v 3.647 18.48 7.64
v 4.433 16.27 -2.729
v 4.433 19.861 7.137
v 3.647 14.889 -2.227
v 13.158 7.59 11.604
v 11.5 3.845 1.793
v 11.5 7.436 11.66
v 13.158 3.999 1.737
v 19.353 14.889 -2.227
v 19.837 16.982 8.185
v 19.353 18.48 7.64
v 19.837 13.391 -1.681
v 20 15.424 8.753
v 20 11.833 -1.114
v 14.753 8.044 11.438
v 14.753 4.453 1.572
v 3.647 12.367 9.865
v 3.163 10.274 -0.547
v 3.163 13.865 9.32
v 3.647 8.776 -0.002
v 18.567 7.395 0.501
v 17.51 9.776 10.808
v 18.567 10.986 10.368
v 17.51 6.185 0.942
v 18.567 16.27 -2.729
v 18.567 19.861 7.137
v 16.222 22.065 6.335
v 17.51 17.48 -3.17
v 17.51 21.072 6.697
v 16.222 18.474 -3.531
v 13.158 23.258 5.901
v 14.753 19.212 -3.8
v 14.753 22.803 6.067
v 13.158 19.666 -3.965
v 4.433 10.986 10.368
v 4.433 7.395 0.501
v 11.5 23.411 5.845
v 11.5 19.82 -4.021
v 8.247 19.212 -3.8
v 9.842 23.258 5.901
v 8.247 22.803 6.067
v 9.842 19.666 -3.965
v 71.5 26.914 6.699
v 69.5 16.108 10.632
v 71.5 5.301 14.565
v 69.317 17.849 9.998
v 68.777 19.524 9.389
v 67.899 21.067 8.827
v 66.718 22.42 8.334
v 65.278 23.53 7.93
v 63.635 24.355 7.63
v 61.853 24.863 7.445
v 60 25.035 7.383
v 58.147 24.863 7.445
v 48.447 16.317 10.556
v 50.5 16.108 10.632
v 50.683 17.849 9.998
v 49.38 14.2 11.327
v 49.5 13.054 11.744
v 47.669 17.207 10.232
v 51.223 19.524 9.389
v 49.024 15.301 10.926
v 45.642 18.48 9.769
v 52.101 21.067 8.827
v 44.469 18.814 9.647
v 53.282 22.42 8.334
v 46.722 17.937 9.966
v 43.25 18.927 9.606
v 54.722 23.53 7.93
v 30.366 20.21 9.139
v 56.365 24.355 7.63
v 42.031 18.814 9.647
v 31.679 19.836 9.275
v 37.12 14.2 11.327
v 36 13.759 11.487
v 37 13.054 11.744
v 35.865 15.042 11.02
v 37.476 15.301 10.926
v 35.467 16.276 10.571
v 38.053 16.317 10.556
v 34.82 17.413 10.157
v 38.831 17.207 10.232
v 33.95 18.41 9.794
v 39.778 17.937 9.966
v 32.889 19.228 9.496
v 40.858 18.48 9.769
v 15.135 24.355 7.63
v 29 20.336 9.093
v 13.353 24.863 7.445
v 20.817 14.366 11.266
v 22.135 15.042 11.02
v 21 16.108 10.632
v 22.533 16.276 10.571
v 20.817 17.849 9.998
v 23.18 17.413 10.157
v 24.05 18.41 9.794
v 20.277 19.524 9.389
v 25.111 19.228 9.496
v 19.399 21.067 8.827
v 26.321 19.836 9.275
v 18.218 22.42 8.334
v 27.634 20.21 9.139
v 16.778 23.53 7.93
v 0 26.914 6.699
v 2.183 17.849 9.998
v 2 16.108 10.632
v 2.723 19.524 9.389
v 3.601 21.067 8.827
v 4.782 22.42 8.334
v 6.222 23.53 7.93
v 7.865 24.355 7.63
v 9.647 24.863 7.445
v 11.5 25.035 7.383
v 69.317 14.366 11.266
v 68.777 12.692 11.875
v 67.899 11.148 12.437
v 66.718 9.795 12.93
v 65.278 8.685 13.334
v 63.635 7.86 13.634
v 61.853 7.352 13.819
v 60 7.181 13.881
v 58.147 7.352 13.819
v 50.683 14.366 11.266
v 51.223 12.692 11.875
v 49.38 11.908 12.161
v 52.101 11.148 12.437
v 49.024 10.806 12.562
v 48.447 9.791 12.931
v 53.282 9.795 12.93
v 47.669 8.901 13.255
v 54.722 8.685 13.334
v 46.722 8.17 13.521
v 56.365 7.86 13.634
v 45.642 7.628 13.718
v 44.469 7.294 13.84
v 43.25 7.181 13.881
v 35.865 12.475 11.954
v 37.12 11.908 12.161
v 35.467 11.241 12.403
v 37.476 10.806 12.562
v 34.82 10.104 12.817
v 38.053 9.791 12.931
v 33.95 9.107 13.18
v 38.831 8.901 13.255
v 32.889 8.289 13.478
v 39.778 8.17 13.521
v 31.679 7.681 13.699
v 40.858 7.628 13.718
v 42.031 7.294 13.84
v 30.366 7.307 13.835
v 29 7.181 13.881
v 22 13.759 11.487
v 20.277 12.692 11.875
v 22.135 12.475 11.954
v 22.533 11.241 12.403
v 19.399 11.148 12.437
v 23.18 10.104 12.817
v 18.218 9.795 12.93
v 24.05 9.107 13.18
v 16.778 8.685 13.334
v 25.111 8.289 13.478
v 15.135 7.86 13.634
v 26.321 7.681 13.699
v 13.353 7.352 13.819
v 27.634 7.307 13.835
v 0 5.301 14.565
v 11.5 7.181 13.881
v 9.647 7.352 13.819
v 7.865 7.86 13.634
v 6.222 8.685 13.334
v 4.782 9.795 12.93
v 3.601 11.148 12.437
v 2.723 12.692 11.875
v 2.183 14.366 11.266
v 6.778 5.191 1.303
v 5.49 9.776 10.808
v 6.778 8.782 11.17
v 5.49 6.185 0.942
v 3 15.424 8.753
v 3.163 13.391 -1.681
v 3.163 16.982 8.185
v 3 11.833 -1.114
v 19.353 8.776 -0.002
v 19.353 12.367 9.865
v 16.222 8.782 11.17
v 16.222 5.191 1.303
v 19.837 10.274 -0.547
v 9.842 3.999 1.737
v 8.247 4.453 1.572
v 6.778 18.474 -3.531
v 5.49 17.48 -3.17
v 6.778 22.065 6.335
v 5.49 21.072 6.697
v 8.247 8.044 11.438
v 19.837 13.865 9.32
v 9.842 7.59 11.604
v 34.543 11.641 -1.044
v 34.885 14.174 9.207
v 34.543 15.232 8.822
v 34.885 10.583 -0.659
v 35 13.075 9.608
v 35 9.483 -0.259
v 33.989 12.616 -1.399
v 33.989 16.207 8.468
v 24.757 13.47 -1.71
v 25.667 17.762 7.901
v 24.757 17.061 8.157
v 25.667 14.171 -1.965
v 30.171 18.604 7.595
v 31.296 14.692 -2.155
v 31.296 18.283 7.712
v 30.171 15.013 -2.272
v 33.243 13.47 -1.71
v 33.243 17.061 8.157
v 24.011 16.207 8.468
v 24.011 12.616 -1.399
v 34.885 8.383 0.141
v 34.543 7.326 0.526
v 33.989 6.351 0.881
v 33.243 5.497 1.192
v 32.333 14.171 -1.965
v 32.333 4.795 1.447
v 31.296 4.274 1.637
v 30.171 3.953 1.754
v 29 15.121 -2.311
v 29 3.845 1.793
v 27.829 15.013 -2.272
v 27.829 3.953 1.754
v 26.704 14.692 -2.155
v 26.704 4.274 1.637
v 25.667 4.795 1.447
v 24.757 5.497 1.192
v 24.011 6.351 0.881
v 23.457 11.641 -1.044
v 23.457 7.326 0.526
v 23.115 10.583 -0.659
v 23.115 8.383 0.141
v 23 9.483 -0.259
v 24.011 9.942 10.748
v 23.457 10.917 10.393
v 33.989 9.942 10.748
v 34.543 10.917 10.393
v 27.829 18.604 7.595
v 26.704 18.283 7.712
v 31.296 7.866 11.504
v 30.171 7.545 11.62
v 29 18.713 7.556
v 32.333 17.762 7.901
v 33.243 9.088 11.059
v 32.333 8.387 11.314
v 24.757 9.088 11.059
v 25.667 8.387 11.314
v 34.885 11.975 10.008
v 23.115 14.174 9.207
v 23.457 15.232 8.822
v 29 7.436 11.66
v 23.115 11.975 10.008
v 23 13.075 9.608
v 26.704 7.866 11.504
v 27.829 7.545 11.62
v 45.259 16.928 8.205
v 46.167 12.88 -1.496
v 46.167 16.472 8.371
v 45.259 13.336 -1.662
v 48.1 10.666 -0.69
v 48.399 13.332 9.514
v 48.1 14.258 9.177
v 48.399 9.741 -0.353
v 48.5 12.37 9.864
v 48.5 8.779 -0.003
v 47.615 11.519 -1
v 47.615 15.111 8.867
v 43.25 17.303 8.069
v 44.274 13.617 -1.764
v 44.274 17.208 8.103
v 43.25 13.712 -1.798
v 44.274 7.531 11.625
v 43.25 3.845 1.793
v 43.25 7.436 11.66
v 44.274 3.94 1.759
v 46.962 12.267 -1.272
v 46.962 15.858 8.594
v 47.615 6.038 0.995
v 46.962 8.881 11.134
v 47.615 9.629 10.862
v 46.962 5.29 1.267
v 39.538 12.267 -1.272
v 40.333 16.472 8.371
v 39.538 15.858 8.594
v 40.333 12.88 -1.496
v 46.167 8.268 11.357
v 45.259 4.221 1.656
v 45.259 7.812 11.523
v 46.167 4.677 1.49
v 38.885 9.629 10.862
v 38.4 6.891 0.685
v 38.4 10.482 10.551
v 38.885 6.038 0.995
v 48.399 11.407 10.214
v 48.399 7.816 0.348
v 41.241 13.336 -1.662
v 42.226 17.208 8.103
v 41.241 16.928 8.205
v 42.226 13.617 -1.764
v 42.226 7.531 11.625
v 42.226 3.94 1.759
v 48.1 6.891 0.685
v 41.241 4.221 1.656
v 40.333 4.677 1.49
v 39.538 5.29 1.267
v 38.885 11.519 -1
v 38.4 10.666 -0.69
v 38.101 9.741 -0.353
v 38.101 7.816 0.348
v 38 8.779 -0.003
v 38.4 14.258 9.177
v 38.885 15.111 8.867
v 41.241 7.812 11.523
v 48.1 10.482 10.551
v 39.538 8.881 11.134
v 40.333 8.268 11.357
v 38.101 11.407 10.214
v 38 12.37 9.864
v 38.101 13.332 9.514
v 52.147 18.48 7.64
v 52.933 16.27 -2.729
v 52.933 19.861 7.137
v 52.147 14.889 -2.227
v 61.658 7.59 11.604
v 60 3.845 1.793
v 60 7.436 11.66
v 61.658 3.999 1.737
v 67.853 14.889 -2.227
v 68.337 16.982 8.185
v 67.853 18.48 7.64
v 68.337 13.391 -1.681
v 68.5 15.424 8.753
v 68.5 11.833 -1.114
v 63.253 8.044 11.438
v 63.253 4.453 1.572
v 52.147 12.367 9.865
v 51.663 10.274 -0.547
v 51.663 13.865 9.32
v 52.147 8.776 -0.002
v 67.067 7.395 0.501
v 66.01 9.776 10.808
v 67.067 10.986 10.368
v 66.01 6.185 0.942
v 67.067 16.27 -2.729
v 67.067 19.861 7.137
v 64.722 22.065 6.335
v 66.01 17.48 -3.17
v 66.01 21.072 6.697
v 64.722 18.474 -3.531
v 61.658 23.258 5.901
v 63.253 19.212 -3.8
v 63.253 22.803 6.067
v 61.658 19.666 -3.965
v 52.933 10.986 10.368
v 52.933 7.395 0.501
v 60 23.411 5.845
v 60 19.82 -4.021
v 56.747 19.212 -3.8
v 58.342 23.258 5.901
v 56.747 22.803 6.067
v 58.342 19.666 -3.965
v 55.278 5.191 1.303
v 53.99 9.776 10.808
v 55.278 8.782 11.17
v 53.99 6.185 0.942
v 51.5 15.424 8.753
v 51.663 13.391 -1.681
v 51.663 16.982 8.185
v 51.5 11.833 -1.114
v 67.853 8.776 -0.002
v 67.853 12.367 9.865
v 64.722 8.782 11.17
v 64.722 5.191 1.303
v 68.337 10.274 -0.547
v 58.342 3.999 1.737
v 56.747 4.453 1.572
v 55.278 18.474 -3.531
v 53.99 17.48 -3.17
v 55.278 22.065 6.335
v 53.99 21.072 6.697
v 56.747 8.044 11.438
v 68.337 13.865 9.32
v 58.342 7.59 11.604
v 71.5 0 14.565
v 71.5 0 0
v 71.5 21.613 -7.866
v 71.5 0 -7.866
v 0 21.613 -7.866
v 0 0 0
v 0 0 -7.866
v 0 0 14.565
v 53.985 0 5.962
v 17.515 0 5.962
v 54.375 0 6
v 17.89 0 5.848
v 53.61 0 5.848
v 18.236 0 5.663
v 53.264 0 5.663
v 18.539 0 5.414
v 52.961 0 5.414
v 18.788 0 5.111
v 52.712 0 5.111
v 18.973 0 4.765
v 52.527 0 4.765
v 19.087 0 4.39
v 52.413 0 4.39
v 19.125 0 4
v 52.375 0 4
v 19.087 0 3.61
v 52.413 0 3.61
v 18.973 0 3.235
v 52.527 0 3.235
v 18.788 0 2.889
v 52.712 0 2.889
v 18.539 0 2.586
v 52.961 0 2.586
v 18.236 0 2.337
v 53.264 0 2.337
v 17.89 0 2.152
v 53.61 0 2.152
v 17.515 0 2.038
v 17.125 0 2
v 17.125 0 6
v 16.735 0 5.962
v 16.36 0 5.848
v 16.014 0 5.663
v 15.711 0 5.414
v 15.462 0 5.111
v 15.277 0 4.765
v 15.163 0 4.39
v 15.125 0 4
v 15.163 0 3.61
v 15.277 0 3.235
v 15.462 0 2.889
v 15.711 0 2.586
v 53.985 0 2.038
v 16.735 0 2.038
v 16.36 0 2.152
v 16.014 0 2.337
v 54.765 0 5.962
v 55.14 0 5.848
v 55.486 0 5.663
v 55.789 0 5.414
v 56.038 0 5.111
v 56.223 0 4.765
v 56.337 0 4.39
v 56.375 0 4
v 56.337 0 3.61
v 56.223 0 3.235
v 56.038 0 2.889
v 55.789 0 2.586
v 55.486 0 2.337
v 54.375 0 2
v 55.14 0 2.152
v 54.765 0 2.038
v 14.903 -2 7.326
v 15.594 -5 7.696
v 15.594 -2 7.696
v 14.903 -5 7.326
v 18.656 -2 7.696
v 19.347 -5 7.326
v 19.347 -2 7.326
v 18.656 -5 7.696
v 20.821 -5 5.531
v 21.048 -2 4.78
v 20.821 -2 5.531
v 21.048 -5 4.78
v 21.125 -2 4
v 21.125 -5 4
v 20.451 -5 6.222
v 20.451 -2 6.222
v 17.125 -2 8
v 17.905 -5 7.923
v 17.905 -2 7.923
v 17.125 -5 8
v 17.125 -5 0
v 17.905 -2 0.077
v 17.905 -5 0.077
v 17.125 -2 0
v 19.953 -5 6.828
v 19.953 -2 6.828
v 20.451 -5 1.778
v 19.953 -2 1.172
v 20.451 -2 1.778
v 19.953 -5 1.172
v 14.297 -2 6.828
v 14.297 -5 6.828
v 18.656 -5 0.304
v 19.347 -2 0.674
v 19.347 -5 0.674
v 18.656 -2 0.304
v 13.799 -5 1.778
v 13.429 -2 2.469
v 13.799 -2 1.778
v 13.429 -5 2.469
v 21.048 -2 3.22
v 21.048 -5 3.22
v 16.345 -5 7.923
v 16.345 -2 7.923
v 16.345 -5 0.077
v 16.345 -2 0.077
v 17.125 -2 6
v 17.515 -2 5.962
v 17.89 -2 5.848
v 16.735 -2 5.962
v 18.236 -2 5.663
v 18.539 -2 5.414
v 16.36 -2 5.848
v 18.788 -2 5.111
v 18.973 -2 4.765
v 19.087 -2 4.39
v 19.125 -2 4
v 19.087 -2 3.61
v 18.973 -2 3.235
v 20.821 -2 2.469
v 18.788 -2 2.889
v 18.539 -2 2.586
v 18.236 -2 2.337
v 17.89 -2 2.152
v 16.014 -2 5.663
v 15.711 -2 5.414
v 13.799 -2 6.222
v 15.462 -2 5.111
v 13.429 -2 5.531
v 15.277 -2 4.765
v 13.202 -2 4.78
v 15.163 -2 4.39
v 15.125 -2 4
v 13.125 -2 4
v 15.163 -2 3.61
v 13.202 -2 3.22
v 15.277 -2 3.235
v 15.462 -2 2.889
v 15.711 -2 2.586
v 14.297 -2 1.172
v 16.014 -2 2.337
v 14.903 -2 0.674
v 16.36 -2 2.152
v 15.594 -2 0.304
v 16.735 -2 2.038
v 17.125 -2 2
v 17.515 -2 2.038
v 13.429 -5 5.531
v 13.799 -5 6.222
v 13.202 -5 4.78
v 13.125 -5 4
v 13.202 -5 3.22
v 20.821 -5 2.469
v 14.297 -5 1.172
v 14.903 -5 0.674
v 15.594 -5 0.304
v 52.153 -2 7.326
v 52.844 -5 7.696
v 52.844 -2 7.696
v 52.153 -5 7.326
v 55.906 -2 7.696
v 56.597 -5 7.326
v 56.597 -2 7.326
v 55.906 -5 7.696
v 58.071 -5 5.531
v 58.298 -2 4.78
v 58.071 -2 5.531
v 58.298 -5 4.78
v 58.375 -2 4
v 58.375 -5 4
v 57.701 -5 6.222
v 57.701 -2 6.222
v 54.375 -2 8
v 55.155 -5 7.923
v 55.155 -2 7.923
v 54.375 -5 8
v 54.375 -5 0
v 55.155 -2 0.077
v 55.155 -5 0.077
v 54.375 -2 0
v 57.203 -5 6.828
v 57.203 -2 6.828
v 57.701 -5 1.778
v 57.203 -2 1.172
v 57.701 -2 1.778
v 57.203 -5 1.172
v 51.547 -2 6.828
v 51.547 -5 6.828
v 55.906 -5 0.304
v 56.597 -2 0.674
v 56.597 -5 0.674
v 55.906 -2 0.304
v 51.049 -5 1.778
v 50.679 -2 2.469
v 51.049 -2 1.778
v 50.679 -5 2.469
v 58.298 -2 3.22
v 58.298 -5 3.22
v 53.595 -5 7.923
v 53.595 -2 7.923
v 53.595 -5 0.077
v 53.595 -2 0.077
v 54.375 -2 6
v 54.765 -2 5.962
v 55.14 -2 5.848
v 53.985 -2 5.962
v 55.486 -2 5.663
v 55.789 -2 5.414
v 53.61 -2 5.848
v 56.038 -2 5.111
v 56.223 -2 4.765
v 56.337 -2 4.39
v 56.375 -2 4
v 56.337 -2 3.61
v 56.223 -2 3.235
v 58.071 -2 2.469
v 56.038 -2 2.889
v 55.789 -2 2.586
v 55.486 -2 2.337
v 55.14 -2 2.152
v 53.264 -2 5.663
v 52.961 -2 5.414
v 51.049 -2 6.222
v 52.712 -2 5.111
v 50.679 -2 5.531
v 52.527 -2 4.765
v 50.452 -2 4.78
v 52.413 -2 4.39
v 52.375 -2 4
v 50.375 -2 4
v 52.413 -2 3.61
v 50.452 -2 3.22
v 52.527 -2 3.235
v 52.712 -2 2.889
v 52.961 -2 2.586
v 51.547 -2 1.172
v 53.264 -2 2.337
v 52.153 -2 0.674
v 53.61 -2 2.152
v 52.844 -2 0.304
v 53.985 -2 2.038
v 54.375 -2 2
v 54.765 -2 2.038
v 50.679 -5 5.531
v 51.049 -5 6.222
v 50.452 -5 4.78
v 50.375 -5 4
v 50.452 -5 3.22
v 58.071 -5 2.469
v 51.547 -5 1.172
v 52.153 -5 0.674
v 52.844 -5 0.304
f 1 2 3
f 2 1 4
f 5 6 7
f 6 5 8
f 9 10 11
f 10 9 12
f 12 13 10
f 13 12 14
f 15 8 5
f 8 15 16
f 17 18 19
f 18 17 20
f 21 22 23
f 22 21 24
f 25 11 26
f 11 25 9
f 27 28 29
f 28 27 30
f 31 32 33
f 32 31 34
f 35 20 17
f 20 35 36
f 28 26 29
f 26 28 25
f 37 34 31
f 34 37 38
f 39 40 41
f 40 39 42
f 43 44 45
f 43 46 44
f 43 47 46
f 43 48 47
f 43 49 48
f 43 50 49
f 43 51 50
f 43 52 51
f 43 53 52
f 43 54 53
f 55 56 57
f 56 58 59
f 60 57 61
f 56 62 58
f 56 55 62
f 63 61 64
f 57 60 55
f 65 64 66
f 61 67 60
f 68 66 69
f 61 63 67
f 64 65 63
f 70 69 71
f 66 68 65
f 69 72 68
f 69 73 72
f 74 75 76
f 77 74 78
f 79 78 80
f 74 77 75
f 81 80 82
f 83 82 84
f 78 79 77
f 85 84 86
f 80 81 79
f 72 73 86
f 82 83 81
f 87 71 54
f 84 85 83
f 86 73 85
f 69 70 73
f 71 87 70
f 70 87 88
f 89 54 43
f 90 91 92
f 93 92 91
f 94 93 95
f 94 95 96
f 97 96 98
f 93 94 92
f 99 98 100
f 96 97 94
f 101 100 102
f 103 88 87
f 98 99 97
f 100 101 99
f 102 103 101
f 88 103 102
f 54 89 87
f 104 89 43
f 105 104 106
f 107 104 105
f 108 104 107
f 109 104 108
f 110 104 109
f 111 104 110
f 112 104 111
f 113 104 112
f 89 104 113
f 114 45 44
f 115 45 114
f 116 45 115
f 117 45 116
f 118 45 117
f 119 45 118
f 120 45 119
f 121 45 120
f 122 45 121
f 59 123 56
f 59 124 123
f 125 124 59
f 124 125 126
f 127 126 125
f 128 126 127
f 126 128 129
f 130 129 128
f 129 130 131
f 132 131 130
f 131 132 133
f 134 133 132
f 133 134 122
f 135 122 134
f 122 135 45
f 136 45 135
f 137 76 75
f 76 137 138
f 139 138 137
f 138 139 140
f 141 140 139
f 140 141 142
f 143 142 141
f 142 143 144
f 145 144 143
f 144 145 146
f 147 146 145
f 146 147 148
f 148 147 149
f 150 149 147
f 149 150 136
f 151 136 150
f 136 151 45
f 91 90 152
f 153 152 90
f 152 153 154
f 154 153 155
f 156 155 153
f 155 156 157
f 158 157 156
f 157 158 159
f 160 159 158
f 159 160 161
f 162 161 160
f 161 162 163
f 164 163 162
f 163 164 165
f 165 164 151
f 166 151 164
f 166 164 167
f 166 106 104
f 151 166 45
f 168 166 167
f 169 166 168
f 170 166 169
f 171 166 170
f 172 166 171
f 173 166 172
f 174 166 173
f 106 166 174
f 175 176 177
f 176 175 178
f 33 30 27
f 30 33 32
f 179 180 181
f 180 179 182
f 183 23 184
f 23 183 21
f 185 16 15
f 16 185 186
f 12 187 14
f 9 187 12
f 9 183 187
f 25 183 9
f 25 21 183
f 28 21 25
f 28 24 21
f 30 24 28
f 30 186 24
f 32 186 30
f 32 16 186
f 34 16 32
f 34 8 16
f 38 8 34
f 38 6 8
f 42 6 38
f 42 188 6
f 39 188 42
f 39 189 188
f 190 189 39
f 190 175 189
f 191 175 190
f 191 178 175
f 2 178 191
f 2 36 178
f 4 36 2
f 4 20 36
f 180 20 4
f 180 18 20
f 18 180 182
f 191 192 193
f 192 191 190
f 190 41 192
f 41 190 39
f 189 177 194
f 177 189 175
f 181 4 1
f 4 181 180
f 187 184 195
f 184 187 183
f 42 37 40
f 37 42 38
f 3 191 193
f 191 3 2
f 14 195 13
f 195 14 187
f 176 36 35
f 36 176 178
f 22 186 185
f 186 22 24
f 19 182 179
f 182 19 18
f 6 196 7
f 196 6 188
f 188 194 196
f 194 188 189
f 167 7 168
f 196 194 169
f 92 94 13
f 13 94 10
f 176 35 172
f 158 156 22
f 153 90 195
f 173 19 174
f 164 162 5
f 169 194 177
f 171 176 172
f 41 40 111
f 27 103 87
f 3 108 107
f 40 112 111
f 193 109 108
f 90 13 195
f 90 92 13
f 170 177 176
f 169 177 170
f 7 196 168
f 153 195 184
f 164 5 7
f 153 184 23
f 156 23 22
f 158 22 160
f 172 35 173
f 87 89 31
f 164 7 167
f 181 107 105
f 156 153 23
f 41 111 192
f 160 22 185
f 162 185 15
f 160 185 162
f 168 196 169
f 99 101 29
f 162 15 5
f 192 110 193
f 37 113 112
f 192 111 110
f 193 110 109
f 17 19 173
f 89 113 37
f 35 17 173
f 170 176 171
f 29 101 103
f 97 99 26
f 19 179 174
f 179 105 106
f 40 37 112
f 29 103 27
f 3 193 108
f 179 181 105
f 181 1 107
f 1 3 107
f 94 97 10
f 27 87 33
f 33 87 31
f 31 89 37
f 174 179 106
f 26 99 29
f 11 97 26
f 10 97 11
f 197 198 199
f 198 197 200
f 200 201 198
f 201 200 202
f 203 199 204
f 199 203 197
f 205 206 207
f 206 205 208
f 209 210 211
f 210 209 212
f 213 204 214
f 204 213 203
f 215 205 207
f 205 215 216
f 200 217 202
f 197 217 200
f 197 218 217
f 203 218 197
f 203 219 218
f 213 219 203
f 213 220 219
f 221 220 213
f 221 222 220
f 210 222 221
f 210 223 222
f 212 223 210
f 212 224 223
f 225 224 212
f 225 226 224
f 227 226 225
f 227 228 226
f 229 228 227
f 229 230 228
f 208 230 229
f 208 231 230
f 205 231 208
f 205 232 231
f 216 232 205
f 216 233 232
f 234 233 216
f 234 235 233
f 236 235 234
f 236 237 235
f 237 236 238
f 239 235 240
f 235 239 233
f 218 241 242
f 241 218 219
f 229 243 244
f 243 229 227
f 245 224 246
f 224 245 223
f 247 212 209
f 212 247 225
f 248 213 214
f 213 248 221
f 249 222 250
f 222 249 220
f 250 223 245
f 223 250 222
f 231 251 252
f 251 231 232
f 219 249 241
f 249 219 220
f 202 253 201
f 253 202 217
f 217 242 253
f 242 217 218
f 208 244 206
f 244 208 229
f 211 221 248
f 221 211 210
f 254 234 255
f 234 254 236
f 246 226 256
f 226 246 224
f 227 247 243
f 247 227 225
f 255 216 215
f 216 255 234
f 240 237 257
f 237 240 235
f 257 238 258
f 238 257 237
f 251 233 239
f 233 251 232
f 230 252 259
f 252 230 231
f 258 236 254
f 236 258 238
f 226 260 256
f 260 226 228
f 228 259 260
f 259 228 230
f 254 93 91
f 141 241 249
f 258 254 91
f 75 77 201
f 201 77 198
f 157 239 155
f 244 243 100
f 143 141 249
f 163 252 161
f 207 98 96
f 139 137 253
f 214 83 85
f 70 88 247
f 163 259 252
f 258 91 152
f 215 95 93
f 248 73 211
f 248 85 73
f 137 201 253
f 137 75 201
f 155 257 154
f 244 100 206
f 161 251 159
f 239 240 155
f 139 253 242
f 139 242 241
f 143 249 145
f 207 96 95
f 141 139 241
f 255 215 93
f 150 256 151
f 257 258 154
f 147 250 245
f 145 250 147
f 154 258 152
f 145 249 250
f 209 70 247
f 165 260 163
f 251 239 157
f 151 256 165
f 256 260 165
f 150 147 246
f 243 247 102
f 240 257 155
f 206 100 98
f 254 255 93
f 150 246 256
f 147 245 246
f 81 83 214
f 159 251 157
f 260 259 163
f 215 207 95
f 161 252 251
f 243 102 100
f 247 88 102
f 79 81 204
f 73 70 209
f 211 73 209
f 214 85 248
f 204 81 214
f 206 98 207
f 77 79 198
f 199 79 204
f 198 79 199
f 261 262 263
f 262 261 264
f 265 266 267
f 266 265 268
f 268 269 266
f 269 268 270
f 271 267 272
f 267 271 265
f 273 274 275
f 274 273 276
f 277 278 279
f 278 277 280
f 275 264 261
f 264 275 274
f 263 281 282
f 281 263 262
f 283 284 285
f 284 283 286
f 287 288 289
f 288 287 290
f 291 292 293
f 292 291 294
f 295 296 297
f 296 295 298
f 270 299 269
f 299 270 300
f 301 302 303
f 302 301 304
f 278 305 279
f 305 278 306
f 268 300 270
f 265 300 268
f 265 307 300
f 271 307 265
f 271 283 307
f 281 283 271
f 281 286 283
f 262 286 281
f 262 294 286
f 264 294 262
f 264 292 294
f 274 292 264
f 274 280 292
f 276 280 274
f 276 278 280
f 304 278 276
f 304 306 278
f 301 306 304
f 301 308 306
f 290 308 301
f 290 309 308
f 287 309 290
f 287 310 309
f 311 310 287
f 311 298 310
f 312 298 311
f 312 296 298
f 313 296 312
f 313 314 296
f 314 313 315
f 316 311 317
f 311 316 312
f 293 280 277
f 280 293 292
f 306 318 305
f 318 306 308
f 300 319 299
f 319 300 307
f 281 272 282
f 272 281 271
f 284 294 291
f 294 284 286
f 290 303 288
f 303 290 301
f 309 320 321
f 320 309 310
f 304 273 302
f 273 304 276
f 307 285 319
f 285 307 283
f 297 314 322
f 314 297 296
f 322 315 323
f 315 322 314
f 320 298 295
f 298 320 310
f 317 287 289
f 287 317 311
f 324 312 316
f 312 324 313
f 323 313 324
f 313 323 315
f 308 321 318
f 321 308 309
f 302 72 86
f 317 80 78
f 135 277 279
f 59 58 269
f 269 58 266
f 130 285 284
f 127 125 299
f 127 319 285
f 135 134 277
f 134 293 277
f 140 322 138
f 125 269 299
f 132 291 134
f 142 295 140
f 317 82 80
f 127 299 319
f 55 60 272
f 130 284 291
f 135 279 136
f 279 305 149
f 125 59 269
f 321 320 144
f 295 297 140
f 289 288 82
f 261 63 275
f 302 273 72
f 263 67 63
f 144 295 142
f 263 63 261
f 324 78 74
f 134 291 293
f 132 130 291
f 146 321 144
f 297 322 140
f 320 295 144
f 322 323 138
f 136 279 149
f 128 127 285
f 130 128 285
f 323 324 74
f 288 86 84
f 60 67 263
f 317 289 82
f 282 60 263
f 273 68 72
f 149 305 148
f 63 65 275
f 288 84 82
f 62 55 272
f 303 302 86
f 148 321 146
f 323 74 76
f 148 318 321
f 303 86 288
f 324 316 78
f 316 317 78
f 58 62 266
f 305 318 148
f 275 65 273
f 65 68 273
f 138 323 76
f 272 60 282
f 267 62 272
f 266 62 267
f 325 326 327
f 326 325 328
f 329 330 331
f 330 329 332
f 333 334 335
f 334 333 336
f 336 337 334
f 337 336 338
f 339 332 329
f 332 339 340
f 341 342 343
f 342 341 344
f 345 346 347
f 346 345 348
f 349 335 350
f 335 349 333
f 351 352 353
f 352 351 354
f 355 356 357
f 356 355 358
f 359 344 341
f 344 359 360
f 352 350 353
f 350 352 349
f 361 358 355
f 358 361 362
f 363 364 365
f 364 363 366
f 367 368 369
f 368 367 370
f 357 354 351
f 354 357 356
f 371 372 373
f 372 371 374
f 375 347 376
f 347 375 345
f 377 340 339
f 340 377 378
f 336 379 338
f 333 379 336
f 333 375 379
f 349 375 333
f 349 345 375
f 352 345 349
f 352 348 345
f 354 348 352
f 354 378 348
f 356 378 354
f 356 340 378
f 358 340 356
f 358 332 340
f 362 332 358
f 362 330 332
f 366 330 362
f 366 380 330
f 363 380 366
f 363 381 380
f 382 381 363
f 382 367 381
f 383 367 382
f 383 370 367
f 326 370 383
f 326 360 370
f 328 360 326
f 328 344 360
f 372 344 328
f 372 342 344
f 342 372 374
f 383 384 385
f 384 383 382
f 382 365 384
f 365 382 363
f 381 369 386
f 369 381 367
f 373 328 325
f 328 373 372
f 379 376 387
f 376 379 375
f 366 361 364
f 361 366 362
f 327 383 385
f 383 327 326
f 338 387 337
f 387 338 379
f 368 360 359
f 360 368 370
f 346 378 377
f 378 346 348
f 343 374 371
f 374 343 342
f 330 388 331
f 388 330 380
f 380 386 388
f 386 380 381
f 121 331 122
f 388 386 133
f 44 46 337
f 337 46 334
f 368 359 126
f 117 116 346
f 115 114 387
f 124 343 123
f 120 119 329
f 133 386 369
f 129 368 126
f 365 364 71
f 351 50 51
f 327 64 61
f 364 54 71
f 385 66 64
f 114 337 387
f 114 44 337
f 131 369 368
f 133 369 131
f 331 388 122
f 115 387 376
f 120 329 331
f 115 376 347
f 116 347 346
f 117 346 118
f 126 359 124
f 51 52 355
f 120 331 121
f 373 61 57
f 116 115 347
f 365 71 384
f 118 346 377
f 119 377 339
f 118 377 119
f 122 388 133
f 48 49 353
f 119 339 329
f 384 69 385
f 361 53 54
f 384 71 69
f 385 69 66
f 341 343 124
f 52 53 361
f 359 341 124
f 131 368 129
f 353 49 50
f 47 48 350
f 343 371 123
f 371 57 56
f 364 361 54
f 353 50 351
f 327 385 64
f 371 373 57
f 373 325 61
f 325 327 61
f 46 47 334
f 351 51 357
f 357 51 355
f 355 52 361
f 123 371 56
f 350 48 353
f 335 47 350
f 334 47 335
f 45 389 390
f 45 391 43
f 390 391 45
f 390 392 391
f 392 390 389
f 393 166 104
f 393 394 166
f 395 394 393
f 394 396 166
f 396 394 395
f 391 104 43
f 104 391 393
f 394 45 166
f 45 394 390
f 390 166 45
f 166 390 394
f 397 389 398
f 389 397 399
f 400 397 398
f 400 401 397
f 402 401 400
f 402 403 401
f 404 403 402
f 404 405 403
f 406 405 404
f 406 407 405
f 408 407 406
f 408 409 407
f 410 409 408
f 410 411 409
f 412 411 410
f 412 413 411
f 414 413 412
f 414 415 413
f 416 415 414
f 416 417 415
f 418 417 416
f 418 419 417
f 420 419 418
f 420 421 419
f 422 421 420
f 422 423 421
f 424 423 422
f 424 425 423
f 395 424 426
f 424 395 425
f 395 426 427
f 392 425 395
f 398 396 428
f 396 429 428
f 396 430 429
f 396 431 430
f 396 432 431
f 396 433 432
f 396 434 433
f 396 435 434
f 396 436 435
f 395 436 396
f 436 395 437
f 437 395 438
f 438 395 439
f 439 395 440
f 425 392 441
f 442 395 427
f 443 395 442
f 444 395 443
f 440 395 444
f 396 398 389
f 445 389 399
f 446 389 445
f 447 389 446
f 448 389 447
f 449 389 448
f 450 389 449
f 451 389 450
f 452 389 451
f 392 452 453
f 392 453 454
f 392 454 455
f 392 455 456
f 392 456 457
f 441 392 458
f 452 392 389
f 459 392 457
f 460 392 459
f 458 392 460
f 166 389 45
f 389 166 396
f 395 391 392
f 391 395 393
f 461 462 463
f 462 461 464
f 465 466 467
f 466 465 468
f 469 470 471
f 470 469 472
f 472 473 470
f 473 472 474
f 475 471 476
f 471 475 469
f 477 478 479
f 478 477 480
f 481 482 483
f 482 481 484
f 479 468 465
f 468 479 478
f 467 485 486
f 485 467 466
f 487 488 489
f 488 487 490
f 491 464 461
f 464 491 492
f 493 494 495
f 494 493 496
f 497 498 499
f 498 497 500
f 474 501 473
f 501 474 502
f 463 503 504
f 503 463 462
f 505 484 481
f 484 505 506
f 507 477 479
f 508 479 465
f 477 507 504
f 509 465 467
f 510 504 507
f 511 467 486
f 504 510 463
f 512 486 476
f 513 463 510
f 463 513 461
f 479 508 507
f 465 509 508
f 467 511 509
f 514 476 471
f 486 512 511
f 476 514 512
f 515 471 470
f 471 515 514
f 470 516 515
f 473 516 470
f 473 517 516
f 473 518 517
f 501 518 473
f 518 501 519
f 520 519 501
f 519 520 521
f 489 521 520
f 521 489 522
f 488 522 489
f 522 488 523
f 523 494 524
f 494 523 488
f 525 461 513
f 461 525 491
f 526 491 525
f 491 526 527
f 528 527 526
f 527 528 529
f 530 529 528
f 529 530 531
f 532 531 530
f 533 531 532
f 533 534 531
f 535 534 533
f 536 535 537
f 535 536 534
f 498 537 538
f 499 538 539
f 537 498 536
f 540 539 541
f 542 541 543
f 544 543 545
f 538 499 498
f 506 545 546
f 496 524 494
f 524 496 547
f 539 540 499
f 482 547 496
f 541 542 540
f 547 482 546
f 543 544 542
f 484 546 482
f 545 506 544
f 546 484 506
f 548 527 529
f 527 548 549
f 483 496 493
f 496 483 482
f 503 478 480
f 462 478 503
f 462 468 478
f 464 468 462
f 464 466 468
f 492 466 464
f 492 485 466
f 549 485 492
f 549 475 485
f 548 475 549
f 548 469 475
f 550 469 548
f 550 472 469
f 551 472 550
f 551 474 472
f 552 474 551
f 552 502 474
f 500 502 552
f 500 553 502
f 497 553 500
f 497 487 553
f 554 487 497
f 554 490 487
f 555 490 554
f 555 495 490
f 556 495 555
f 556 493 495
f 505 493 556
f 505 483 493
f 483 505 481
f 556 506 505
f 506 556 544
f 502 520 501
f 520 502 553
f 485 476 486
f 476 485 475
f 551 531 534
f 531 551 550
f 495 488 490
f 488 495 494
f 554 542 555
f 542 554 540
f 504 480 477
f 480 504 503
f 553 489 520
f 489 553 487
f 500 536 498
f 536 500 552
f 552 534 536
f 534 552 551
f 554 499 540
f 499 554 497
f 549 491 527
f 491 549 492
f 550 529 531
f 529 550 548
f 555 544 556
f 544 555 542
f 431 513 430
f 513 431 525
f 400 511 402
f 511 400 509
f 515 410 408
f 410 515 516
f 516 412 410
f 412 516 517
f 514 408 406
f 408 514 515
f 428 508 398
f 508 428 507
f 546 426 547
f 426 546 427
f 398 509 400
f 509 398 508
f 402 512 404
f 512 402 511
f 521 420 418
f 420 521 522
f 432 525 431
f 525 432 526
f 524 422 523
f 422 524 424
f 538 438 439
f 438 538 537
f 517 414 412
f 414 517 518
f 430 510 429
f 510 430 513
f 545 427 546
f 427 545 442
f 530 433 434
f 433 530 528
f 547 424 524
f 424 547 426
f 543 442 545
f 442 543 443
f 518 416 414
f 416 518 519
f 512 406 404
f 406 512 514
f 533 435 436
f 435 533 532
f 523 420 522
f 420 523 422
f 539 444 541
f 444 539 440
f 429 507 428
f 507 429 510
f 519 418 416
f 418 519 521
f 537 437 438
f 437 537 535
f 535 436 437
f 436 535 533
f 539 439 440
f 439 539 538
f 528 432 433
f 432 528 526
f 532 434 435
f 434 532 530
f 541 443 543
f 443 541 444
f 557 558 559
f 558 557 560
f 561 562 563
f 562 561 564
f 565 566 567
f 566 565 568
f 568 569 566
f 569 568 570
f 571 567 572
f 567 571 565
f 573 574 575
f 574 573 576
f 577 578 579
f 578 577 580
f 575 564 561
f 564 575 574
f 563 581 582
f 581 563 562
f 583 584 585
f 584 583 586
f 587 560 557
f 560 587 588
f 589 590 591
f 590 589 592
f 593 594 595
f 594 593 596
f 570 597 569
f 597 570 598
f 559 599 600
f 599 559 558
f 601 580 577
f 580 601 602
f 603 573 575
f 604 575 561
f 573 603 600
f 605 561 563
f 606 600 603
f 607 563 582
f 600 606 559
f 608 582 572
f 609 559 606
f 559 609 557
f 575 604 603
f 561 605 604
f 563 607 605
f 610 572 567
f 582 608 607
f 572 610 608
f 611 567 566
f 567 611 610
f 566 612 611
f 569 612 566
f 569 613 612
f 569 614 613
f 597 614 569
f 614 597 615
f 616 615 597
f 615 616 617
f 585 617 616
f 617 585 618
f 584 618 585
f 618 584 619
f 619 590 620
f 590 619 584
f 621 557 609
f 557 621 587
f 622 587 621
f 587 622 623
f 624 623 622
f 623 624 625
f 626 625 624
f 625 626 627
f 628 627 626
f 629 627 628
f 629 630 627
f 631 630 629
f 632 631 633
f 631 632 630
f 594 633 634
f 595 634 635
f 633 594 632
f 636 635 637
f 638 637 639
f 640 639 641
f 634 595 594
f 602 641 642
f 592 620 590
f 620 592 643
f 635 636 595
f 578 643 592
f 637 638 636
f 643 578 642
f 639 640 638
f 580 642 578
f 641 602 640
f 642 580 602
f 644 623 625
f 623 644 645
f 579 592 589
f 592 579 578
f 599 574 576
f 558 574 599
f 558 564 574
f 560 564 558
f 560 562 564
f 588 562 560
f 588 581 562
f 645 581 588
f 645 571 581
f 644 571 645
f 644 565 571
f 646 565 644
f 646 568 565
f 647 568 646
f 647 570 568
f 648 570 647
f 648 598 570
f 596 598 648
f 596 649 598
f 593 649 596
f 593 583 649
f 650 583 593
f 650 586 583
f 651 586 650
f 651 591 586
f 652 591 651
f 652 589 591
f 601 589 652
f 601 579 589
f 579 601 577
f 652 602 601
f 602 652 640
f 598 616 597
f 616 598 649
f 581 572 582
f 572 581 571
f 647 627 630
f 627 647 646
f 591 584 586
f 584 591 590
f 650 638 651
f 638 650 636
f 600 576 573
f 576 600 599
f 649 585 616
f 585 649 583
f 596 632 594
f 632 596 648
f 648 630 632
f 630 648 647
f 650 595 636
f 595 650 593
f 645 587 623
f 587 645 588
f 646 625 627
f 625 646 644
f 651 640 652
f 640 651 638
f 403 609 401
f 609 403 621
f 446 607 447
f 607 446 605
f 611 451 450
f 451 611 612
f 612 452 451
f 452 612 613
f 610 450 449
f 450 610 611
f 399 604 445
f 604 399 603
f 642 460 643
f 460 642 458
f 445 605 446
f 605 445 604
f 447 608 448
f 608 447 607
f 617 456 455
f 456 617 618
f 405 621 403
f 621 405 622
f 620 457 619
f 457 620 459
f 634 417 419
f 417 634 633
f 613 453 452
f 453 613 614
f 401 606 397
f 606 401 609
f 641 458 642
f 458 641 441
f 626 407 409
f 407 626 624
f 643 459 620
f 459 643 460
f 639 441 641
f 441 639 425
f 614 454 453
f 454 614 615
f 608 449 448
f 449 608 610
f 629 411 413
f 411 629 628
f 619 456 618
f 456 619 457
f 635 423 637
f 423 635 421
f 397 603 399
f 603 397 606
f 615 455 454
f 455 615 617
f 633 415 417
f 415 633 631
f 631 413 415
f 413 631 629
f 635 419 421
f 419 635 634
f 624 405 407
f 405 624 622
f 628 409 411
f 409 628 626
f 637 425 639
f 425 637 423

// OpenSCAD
// file: modules/module_pegs.scad
module pegs_lux(width,rows)
{
    dia_knob    = 8;
    len_knob    = 3;
    dia_pin     = 4;
    wall        = 2;
    dist        = 37.25;
    height      = 25;
    
    pegs(dist,height,wall,dia_knob,len_knob,dia_pin,rows);
}

module pegs_hornbach(width,rows)
{
    dia_knob    = 8;
    len_knob    = 3;
    dia_pin     = 4;
    wall        = 2;
    dist        = 45;
    height      = 45;
    
    pegs(dist,height,wall,dia_knob,len_knob,dia_pin);
}

module pegs(dist,height,wall,dia_knob,len_knob,dia_pin,rows)
{
    for(off_y=[0:height:(rows-1)*height])
    {
        translate([dia_knob/2,0,off_y+dia_knob/2])
        {
            for(i=[0:dist:width-dia_knob])
            {
                translate([i+((width-dia_knob)%dist)/2,0,0])
                {
                    peg(wall,dia_knob,len_knob,dia_pin);
                }
            }
        }
    }
}

module peg(wall,dia_knob,len_knob,dia_pin)
{
    rotate([90,0,0])
    {
        translate([0,0,wall])
        {
            cylinder(h=len_knob,d=dia_knob);
        }
        translate([0,0,0])
        {
            cylinder(h=wall,d=dia_pin);
        }
    }
}
// file: modules/module_sockets.scad
function partialsum(list,start,end) = [for (sum=0, i=start; i<=end; nsum=sum+list[i], i=i+1, sum=nsum) sum];

module wrench_sockets(size_array,space,depth,angle)
{
    width = max(size_array)+2*space;
    height = depth+space;
    length_vec      = partialsum(size_array,0,len(size_array)-1);
    total_length    = length_vec[len(length_vec)-1]
                    + size_array[len(size_array)-1]
                    + space*(len(size_array)-1)
                    + 2*space;
    
    // upper wedge
    rotate([90,0,90])
    {
        linear_extrude(height = total_length)
        {
            polygon([[0,0],[0,height*cos(angle)],[height*sin(angle),height*cos(angle)]]);
        }
    }

    // lower wedge
    translate([0,0,0.000001]) // fix for non manifold
    {
        rotate([0,90,0])
        {
            linear_extrude(height = total_length)
            {
                polygon([[0,0],[width*sin(angle),0],[width*sin(angle),width*cos(angle)]]);
            }
        }
    }

    // main body
    rotate([-angle,0,0])
    {
        difference()
        {
            cube([total_length,width,depth+space]);
            
            for(num=[0:1:len(size_array)-1])
            {
                off=partialsum(size_array,0,num);
                translate([off[num]+size_array[num]/2+num*space+space,
                           size_array[num]/2+space,
                           space])
                {
                    cylinder(h=depth,d=size_array[num]);
                    translate([0,0,depth-2])
                    {
                        cylinder(h=2,d1=size_array[num],d2=size_array[num]+2);
                    }
                }
            }
        }
    }
}
// main file
$fn=32;

include <modules/module_sockets.scad>
include <modules/module_pegs.scad>

sockets         = [17,12,10.5,17];
space           = 3;
depth           = 12.5;
angle           = 20;
rows            = 1;

// calculate total length for connectors
length_vec      = partialsum(sockets,0,len(sockets)-1);
width           = length_vec[len(length_vec)-1]
                + sockets[len(sockets)-1]
                + space*(len(sockets)-1)
                + 2*space;

wrench_sockets(sockets,space,depth,angle);
pegs_lux(width,rows);
